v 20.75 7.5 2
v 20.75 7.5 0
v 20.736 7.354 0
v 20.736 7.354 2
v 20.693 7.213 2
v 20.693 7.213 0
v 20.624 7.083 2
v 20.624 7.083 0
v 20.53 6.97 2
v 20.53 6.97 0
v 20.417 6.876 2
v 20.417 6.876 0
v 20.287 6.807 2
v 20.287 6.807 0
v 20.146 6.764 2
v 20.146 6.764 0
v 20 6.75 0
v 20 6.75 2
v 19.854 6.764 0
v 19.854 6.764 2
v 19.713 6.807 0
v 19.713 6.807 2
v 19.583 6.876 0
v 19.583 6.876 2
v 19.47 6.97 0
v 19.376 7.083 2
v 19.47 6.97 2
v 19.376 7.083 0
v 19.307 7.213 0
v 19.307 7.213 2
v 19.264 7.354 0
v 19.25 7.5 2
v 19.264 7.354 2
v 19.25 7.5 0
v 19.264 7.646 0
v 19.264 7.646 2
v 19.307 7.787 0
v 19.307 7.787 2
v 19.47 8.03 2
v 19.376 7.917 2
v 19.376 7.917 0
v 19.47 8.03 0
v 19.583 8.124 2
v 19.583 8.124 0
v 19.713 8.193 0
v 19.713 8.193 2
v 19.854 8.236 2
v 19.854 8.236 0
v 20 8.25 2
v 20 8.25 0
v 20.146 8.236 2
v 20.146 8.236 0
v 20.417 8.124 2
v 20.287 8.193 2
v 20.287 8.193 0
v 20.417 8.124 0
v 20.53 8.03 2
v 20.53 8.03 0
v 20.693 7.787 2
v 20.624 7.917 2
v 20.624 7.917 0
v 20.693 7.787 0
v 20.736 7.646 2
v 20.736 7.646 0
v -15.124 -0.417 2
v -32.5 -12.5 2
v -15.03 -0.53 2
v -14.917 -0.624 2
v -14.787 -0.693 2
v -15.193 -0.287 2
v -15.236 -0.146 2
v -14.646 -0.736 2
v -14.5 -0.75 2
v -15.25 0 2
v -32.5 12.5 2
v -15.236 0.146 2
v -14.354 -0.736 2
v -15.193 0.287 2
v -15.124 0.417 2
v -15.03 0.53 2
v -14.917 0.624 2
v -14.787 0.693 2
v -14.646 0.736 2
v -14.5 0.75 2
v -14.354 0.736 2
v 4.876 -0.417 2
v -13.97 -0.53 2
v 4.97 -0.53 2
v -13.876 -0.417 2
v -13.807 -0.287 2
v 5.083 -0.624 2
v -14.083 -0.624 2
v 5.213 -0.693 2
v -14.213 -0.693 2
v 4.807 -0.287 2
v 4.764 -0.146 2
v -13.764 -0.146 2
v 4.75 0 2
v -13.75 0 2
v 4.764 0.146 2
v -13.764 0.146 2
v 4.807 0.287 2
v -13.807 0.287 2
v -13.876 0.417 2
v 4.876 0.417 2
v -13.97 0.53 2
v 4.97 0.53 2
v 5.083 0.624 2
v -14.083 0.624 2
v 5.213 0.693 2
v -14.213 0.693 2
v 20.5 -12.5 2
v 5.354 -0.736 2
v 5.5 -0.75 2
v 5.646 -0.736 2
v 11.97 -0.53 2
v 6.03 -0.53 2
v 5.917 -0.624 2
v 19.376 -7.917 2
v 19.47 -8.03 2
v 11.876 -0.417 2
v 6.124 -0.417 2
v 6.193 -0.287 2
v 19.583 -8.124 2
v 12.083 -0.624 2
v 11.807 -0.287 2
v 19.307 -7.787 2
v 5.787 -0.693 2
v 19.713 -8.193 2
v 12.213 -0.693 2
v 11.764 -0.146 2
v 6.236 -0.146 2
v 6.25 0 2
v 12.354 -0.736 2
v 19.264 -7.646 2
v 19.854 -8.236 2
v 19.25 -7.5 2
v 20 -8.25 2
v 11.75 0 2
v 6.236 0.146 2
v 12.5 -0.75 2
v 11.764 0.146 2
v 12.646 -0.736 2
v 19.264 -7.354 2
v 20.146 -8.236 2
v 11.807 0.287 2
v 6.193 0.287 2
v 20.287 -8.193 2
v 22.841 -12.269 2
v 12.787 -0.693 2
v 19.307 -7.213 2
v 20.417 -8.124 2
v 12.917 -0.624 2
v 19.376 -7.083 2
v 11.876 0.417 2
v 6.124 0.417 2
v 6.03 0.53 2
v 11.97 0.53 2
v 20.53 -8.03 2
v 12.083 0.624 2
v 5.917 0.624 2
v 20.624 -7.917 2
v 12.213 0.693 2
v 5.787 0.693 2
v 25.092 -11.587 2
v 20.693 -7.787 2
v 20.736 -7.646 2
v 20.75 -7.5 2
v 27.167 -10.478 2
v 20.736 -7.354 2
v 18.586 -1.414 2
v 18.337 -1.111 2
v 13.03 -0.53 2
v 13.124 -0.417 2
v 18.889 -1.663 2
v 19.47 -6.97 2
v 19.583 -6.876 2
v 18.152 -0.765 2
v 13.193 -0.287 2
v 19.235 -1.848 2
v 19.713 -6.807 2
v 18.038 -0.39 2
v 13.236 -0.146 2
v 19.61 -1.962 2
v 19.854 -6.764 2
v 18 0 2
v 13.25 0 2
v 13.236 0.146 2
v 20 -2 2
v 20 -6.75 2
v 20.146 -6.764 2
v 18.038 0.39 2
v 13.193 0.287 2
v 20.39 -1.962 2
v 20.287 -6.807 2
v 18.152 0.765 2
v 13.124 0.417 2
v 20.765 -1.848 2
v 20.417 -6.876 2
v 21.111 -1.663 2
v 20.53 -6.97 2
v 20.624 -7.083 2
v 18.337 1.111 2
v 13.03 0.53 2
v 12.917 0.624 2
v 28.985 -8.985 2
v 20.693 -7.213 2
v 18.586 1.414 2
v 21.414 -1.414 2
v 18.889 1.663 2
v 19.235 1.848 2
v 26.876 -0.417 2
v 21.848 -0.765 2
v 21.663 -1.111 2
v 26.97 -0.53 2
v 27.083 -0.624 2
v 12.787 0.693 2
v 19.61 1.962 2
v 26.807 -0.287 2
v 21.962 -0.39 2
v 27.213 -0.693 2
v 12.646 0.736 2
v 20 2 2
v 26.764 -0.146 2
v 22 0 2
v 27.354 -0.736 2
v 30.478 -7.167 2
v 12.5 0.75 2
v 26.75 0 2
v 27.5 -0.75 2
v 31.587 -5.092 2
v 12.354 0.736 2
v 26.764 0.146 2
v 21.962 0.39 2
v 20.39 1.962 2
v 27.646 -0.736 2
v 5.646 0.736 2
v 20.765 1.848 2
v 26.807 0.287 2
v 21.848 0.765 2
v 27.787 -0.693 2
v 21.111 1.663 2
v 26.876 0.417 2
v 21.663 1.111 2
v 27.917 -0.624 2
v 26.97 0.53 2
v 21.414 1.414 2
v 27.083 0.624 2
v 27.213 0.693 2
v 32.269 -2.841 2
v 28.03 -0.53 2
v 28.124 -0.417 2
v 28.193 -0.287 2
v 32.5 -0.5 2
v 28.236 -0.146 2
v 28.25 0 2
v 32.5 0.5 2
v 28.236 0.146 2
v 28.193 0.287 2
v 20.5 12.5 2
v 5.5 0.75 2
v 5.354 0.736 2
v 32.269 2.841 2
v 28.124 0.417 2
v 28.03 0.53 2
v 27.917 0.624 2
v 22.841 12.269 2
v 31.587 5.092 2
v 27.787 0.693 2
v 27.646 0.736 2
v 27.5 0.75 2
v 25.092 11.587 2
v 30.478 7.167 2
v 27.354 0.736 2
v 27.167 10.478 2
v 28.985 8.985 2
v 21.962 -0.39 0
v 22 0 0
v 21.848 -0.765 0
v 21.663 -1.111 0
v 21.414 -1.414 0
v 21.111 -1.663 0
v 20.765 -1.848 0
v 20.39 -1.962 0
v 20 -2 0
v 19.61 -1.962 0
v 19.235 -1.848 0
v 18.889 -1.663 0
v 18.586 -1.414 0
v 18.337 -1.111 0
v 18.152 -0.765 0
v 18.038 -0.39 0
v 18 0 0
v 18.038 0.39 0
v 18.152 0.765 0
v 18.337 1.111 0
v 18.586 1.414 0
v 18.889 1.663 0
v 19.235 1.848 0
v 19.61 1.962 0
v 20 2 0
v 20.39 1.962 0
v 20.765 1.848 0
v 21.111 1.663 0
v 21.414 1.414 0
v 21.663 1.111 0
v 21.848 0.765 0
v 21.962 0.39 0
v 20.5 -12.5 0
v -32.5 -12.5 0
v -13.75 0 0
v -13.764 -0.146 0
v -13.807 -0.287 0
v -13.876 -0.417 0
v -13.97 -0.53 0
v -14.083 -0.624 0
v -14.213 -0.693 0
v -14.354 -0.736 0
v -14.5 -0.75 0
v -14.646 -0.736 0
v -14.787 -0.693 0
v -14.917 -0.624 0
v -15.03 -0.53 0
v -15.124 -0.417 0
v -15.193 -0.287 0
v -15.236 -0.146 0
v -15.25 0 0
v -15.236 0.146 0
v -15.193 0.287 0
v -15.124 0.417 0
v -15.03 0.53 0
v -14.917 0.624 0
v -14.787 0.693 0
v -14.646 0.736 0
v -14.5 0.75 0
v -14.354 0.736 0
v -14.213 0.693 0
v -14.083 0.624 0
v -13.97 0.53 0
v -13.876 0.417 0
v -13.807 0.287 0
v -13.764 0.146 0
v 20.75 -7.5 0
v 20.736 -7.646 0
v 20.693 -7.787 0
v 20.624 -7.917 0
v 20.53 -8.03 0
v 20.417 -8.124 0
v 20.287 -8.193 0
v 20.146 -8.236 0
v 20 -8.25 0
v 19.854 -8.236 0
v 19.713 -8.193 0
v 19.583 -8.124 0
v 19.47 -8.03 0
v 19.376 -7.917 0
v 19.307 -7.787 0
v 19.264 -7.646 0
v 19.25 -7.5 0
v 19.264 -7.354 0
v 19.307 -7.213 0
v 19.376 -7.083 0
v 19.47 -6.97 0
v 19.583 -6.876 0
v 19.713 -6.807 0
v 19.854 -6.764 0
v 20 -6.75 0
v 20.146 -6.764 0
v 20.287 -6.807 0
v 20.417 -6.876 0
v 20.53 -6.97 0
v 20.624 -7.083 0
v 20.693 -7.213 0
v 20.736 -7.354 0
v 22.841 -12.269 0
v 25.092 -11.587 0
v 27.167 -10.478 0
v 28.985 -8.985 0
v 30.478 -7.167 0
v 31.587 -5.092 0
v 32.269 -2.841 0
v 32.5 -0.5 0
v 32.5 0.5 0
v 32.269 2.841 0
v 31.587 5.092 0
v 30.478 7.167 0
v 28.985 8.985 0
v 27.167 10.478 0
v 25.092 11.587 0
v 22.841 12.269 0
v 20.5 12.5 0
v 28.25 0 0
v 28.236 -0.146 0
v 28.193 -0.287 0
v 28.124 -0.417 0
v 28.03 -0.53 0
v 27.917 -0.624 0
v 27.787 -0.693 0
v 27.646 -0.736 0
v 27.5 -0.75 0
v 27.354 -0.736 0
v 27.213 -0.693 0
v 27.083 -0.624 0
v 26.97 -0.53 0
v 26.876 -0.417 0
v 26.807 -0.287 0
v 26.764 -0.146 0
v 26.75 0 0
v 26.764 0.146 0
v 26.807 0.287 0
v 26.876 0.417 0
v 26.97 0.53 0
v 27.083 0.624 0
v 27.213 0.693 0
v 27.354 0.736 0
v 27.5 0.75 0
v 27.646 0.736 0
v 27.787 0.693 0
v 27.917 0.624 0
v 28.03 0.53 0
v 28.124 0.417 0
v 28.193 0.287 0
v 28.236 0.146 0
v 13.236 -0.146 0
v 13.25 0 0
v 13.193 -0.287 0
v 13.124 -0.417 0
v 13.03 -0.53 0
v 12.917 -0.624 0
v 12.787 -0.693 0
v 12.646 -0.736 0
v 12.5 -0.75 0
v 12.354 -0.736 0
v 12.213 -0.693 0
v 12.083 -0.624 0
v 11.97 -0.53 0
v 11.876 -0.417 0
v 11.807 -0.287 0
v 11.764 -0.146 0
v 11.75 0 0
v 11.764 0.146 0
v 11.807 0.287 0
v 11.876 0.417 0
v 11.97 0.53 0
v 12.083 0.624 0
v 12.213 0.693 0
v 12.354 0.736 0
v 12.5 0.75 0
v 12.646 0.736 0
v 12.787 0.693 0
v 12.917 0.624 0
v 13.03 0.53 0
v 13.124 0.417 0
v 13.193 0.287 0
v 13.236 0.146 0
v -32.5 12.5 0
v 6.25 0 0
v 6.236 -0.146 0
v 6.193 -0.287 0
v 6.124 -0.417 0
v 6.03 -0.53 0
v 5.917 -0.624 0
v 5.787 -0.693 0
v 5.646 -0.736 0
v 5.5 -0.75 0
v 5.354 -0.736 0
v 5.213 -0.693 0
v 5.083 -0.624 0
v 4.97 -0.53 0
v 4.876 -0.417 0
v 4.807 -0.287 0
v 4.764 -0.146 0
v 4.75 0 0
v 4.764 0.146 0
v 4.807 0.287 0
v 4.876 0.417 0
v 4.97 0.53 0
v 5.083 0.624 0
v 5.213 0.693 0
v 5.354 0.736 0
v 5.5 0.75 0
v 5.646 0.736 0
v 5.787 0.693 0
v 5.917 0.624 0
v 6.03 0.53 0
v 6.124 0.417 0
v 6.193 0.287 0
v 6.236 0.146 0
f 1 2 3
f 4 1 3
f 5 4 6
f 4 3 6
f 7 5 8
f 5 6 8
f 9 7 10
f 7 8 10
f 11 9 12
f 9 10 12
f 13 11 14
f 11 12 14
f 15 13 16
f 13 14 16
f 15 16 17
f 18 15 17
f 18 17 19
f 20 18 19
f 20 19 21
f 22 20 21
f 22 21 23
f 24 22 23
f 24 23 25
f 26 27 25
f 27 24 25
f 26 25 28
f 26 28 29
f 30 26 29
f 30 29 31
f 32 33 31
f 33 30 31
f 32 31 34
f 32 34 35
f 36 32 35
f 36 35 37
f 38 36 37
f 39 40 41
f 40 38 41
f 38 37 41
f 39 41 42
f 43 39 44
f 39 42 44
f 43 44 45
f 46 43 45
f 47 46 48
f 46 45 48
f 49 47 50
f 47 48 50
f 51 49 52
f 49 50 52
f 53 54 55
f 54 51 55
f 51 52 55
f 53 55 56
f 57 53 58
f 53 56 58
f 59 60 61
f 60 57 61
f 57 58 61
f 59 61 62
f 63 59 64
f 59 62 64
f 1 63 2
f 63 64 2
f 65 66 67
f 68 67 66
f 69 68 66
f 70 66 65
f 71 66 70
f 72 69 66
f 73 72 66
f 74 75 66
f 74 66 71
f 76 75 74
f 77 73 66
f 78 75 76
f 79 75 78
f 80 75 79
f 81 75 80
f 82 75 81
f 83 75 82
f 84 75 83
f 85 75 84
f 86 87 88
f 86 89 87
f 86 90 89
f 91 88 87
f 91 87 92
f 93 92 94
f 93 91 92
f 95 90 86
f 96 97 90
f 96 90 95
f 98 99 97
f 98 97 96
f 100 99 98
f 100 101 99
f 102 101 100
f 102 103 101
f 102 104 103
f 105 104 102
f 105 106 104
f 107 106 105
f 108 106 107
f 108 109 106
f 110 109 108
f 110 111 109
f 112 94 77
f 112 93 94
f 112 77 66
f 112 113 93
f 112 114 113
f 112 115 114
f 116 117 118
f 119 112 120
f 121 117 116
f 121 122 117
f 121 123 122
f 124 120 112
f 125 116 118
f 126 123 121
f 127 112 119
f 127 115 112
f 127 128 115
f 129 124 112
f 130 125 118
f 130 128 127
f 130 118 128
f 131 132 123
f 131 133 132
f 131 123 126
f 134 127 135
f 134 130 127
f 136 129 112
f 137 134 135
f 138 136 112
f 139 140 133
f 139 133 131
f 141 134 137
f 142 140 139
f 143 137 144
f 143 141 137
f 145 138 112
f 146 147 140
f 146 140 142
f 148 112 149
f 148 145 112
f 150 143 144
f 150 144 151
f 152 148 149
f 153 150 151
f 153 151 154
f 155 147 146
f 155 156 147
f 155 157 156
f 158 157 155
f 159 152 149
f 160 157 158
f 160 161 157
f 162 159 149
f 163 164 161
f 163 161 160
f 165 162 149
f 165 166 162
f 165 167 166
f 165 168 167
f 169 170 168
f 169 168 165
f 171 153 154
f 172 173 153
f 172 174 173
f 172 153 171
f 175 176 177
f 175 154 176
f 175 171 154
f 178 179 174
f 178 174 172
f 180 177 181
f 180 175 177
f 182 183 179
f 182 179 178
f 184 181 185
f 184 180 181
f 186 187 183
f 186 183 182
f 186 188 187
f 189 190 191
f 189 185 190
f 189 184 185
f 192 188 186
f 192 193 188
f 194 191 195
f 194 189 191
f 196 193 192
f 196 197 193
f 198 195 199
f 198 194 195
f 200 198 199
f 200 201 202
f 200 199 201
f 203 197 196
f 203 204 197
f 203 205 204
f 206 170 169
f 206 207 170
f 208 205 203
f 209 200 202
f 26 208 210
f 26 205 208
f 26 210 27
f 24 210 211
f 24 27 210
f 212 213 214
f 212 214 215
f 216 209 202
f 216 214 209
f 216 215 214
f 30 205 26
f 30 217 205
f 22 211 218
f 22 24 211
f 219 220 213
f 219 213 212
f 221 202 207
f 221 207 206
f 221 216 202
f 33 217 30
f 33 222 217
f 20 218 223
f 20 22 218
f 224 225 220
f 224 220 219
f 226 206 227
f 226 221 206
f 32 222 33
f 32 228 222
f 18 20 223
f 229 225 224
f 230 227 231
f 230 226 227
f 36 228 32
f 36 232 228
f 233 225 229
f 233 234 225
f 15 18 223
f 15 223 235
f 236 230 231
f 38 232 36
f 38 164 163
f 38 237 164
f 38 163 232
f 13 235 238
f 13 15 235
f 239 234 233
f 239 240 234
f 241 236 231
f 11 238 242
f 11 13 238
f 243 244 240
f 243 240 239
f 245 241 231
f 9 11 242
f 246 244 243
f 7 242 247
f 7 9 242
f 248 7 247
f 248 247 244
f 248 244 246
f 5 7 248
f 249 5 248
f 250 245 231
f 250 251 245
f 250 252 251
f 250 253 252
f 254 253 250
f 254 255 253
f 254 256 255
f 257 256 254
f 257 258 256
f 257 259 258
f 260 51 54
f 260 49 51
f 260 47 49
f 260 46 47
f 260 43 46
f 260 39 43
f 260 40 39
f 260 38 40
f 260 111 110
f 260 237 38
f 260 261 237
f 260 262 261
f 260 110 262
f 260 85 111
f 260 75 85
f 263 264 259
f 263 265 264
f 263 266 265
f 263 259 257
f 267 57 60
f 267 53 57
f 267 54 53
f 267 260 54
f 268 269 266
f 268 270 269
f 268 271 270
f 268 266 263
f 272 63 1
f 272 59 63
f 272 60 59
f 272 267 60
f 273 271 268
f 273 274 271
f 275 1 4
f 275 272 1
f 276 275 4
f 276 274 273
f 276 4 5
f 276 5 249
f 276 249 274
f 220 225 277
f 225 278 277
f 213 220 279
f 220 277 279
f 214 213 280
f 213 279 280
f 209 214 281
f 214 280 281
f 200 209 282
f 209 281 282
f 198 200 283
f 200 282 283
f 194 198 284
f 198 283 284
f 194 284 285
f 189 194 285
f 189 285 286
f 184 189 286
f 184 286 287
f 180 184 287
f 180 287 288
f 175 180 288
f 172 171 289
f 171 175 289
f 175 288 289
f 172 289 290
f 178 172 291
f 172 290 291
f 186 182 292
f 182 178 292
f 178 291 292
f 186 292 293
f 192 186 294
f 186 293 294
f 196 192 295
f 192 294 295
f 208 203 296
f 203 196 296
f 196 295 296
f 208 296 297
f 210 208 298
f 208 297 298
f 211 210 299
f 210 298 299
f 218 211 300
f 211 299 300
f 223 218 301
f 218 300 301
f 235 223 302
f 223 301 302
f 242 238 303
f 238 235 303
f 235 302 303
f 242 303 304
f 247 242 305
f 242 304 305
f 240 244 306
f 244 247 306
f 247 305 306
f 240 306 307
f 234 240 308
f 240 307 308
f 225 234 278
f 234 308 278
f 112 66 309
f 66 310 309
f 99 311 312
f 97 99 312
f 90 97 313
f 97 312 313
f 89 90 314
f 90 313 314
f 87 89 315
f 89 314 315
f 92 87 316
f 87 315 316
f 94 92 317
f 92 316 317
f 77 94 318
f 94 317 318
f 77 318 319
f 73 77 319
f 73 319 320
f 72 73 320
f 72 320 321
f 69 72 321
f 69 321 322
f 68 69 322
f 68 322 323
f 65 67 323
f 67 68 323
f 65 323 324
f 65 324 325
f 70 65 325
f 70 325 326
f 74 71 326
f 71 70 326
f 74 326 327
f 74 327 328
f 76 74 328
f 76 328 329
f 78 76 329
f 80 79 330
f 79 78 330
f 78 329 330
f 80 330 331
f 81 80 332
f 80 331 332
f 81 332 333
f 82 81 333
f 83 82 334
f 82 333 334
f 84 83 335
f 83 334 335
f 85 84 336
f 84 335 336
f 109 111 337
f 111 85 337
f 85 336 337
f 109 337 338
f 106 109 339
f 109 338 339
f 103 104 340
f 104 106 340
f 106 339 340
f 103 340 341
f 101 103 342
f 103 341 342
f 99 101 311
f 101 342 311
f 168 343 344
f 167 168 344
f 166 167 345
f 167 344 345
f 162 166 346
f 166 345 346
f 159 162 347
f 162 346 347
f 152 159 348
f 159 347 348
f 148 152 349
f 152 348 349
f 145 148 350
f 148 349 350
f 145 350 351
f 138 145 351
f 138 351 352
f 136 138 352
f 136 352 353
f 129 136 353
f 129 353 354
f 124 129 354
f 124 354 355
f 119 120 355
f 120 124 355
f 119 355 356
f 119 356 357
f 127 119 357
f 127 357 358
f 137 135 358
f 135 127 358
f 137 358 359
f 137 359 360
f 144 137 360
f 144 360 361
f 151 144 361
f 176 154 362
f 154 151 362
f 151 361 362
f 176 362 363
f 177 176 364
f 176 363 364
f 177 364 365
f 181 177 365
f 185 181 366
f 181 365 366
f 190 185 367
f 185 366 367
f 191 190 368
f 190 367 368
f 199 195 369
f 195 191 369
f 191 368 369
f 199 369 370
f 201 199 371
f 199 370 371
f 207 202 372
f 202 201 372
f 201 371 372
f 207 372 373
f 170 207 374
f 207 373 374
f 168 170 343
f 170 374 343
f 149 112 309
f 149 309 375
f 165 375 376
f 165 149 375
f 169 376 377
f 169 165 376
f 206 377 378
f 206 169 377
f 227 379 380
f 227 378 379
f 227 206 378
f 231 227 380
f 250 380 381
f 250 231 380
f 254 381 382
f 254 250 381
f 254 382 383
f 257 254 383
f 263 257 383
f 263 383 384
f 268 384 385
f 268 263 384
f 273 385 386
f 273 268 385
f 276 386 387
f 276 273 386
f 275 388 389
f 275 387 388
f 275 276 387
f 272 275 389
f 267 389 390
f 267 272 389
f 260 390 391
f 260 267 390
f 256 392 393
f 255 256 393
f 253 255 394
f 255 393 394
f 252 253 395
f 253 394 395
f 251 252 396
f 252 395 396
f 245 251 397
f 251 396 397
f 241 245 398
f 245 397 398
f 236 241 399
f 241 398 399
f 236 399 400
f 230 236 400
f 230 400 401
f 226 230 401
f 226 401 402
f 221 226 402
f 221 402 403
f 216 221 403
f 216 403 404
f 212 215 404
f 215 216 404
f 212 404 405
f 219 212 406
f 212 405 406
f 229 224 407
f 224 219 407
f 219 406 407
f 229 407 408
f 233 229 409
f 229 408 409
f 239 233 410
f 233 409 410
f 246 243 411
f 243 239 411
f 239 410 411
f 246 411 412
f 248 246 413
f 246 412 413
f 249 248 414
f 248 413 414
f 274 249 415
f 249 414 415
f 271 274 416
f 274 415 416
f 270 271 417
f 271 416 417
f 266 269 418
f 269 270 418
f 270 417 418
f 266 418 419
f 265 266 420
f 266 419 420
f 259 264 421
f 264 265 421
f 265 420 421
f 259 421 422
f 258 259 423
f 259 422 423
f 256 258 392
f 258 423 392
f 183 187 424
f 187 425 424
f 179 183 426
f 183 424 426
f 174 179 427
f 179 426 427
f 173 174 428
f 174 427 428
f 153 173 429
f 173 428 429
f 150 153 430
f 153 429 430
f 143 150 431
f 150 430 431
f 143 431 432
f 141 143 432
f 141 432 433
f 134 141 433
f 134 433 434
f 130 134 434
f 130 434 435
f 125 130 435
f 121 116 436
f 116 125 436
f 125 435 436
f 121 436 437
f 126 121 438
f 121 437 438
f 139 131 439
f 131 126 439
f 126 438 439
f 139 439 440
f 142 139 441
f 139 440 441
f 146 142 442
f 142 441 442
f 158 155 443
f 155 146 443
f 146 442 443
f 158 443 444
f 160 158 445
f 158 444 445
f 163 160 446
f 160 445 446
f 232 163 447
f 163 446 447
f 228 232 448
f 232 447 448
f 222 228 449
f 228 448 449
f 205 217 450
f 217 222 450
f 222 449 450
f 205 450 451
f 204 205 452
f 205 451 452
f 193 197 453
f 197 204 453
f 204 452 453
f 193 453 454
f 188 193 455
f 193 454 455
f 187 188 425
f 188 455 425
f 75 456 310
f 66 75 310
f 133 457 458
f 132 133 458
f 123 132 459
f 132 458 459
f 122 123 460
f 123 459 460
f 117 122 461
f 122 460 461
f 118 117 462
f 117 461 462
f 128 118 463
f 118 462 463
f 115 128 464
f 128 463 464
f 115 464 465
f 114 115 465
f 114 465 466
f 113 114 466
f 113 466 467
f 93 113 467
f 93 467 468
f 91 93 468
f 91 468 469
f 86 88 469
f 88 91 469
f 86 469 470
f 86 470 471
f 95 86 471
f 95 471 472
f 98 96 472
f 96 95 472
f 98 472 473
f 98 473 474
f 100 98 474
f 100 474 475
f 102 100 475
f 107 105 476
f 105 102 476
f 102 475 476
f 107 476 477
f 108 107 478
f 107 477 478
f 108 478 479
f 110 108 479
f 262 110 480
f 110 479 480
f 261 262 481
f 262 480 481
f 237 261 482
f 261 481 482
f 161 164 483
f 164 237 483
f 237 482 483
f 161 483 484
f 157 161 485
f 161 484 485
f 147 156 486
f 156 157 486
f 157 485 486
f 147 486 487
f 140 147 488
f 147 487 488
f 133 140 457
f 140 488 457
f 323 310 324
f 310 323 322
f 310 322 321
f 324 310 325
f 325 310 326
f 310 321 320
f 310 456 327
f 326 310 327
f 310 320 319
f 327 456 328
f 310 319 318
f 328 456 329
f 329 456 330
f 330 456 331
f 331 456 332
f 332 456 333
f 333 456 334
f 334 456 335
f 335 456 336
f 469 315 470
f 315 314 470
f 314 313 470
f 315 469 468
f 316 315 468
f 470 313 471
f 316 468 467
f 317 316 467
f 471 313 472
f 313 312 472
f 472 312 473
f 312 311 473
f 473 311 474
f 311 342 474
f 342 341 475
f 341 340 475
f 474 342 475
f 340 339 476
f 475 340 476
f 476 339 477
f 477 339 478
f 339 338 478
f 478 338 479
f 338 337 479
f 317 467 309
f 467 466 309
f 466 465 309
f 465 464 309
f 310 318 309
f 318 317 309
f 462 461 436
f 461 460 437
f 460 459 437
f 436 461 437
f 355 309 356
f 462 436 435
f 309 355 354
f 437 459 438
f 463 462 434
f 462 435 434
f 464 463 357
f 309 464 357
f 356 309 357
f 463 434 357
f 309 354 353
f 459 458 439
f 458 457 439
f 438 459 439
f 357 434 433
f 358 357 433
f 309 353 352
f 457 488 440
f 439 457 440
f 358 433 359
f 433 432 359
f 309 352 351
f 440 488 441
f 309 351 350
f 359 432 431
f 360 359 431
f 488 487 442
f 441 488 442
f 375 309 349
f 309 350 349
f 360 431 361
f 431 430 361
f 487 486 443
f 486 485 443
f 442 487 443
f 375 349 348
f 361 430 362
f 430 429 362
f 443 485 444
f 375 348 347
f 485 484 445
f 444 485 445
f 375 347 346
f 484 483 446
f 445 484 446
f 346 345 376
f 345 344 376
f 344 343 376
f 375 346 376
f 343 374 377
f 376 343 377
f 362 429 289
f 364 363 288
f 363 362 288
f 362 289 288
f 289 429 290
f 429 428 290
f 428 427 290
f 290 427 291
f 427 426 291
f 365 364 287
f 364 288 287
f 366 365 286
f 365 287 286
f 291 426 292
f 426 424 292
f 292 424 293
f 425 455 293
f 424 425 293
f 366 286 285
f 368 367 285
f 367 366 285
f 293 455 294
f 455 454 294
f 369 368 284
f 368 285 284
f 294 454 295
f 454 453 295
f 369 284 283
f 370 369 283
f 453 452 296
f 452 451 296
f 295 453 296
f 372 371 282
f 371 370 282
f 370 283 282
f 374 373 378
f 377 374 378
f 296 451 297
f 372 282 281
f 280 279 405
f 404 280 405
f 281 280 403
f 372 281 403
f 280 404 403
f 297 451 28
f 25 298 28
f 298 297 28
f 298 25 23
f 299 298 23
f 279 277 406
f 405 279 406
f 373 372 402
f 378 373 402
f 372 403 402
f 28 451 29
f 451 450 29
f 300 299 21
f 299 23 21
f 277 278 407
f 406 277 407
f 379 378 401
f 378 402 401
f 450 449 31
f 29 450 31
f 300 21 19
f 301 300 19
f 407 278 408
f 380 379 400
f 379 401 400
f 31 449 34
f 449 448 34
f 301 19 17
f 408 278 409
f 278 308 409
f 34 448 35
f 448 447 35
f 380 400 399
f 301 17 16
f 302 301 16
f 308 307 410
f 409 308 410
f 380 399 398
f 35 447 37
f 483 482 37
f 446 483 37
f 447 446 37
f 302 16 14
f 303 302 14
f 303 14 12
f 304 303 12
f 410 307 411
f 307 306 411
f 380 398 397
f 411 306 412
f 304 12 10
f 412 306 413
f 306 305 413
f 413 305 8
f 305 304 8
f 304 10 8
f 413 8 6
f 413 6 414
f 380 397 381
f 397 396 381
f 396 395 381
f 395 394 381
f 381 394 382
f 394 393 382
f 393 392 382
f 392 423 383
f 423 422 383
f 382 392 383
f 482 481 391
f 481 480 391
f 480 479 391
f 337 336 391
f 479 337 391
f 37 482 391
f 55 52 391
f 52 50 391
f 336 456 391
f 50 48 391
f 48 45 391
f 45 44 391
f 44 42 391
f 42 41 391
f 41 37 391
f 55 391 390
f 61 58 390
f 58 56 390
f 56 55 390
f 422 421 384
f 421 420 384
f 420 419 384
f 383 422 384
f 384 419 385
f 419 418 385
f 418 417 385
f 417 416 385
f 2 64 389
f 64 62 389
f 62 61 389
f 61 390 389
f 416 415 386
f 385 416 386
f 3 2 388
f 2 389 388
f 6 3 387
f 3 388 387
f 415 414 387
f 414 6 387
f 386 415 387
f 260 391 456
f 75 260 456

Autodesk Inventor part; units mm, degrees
ref_plane "YZ Plane" through (0, 0, 0) normal (1, 0, 0) x (0, 1, 0)
ref_plane "XZ Plane" through (0, 0, 0) normal (0, 1, 0) x (-1, 0, 0)
ref_plane "XY Plane" through (0, 0, 0) normal (0, 0, 1) x (1, 0, 0)
sketch "Boceto1" plane through (0, 0, 0) normal (0, 0, 1) x (1, 0, 0)
  line L0 (-32.5, -12.5) -> (32.5, -12.5)
  line L1 (32.5, -12.5) -> (32.5, 12.5)
  line L2 (32.5, 12.5) -> (-32.5, 12.5)
  line L3 (-32.5, 12.5) -> (-32.5, -12.5)
  line L4 (-32.5, -12.5) -> (32.5, 12.5) construction
  line L5 (32.5, -12.5) -> (-32.5, 12.5) construction
  circle A0 centre (-14.5, 0) radius 0.75
  circle A1 centre (5.5, 0) radius 0.75
  circle A2 centre (27.5, 0) radius 0.75
  circle A3 centre (20, 0) radius 2
  circle A4 centre (12.5, 0) radius 0.75
  circle A5 centre (20, 7.5) radius 0.75
  circle A6 centre (20, -7.5) radius 0.75
  point P0 (0, 0)
  dimension "d0" = 65
  dimension "d1" = 25
  dimension "d11" = 1.5
  dimension "d12" = 1.5
  dimension "d13" = 1.5
  dimension "d14" = 4
  dimension "d15" = 1.5
  dimension "d16" = 1.5
  dimension "d17" = 1.5
extrude "Extrusión1" add sketch "Boceto1" along normal blind 2
fillet "Empalme1" radius 12 1 edges at (32.5, 12.5, 1)
fillet "Empalme2" radius 12 1 edges at (32.5, -12.5, 1)
sketch "Boceto2" plane through (0, 0, 2) normal (0, 0, 1) x (1, 0, 0)
  point P0 (0, 0)
properties part number "laterales" material "Acero, galvanizado"
